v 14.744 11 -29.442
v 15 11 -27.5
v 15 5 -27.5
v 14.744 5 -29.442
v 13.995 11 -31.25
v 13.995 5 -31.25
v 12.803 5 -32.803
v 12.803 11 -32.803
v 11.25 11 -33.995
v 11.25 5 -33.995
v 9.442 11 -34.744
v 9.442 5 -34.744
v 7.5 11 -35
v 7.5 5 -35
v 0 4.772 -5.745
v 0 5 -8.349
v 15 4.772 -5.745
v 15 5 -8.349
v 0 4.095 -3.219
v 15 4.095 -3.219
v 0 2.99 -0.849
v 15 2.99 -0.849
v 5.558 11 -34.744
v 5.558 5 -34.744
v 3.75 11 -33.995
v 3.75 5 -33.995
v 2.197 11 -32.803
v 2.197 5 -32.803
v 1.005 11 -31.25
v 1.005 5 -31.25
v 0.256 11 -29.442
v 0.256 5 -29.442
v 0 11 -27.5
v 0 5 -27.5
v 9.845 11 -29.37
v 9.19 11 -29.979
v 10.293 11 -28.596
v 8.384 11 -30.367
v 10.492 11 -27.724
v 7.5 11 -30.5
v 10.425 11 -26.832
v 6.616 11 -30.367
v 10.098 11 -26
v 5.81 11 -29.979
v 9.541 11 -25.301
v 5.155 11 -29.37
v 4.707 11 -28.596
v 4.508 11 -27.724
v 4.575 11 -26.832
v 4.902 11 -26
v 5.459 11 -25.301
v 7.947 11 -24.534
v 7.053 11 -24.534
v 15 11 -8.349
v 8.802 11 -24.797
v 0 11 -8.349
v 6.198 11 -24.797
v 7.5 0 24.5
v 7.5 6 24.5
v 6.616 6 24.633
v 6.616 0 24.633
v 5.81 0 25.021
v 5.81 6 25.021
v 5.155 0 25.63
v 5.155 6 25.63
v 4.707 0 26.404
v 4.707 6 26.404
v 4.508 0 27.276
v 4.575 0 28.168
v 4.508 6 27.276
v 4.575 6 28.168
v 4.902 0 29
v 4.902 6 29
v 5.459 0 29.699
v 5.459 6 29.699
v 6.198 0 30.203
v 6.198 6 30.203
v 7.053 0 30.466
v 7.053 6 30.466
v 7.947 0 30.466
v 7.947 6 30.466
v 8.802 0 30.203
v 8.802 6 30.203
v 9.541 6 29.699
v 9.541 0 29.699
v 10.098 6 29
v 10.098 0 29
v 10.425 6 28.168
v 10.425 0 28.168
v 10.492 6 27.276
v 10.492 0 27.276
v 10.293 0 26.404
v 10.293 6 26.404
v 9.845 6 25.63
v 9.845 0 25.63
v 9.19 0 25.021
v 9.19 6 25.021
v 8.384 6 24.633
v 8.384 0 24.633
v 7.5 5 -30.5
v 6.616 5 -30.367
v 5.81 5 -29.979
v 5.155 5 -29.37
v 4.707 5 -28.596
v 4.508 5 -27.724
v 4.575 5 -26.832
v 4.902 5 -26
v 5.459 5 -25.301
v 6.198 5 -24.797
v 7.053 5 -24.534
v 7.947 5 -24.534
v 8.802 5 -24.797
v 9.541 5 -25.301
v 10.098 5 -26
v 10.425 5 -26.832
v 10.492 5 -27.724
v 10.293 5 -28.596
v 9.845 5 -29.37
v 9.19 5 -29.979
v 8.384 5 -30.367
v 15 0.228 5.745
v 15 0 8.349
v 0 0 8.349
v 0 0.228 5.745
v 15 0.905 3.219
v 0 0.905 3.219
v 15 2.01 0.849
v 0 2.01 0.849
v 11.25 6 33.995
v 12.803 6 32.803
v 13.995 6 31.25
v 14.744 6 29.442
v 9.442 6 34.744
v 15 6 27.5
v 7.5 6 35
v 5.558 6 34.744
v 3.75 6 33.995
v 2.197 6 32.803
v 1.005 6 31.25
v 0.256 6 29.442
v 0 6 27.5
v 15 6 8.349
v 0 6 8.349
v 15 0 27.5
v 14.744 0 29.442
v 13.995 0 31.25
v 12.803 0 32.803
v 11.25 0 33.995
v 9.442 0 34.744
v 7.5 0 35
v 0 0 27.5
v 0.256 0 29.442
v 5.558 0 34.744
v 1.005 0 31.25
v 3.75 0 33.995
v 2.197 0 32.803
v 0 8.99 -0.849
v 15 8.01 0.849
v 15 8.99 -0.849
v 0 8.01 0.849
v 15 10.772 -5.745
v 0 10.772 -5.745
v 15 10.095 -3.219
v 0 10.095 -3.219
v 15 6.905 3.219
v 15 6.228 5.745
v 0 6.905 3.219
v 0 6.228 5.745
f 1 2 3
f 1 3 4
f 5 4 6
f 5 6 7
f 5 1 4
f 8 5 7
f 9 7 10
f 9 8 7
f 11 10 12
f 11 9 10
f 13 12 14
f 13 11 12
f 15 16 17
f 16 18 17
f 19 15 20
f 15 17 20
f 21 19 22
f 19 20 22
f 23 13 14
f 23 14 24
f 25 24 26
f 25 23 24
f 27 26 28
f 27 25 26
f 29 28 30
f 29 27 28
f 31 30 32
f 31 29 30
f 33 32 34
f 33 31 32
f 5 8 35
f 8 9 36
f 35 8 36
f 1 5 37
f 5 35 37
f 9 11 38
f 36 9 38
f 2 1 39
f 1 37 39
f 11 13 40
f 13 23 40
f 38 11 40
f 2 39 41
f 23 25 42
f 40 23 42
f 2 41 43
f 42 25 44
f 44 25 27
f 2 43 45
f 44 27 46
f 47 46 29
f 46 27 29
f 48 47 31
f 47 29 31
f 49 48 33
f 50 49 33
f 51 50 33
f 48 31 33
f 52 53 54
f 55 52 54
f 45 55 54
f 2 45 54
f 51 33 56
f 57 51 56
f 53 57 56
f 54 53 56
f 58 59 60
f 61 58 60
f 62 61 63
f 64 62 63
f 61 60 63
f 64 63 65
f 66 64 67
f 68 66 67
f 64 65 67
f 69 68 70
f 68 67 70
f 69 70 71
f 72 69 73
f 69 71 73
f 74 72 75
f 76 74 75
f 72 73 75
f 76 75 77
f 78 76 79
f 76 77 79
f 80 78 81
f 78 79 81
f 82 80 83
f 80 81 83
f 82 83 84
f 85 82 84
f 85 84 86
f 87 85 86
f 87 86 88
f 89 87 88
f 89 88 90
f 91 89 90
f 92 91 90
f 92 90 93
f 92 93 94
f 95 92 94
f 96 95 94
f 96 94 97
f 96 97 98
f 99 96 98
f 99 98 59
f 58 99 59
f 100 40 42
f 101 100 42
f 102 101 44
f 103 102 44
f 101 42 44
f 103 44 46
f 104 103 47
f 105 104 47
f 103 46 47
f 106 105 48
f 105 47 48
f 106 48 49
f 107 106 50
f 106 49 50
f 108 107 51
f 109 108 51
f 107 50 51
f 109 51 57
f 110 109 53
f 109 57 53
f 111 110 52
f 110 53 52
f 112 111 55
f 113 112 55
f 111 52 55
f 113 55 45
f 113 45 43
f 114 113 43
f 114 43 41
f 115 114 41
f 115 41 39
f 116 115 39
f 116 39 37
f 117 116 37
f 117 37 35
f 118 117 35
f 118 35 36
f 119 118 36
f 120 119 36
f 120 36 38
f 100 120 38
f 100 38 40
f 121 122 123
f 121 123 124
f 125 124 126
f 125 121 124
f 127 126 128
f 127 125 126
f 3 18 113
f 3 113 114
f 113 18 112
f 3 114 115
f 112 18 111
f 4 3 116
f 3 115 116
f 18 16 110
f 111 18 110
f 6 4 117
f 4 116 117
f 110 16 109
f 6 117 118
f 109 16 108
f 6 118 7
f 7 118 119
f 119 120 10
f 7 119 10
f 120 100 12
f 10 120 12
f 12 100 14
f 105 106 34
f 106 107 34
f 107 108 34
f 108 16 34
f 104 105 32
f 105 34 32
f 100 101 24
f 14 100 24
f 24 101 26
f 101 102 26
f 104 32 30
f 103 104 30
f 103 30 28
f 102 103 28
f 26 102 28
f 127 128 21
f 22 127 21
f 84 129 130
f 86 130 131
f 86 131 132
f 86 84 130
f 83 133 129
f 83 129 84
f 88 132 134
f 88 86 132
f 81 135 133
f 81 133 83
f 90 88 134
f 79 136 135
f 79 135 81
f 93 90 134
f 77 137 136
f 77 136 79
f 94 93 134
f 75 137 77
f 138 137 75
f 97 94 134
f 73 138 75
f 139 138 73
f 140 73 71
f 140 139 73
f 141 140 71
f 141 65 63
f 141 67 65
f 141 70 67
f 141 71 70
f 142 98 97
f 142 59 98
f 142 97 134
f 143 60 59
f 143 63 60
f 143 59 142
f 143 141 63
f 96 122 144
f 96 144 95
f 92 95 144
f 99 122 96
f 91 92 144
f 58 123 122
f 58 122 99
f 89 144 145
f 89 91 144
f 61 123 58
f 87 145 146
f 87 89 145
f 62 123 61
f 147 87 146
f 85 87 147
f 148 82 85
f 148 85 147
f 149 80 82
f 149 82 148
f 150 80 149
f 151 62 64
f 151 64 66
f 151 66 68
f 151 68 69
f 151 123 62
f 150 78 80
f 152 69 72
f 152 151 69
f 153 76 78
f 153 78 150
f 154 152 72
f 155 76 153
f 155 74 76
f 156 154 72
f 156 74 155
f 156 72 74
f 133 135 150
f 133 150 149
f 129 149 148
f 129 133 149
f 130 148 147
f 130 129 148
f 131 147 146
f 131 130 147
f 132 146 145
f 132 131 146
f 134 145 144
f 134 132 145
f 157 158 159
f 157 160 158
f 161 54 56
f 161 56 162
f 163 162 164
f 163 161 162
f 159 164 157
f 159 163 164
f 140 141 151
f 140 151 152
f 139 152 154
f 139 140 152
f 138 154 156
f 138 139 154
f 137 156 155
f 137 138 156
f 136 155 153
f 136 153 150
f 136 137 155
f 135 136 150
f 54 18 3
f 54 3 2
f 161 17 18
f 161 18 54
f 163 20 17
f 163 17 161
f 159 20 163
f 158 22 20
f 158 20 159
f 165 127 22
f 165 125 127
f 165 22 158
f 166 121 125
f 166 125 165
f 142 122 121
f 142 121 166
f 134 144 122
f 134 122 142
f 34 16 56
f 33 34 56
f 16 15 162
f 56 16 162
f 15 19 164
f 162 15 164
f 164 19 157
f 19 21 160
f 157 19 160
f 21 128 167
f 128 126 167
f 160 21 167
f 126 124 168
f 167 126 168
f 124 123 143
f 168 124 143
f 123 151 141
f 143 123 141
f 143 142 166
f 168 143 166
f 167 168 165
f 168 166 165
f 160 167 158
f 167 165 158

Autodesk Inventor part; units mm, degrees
ref_plane "YZ Plane" through (0, 0, 0) normal (1, 0, 0) x (0, 1, 0)
ref_plane "XZ Plane" through (0, 0, 0) normal (0, 1, 0) x (-1, 0, 0)
ref_plane "XY Plane" through (0, 0, 0) normal (0, 0, 1) x (1, 0, 0)
sketch "Sketch1" plane through (0, 0, 0) normal (1, 0, 0) x (0, 1, 0)
  line L0 (0, 4.3301) -> (0, 35)
  line L1 (0, 35) -> (6, 35)
  line L2 (6, 35) -> (6, 4.3301)
  line L3 (5, -4.3301) -> (5, -35)
  line L4 (5, -35) -> (11, -35)
  line L5 (11, -35) -> (11, -4.3301)
  line L6 (0, 4.3301) -> (5, -4.3301)
  line L7 (2.5, 0) -> (6, 0) construction
  line L8 (6, 4.3301) -> (11, -4.3301)
  point P0 (0, 0)
  dimension "d1" = 6
  dimension "d11" = 6
extrude "Extrusão1" add sketch "Sketch1" along normal blind 15
fillet "Arredondamento1" radius 15 4 edges at (7.5, 11, -4.3301) (7.5, 6, 4.3301) (7.5, 0, 4.3301) (7.5, 5, -4.3301)
fillet "Arredondamento2" radius 7.5 4 edges at (15, 3, 35) (0, 3, 35) (15, 8, -35) (0, 8, -35)
sketch "Esboço2" plane through (0, 0, 8.3494) normal (0, -1, 0) x (1, 0, 0)
  line L0 (0, -9.1987) -> (15, -9.1987) projected
  arc A0 (15, 19.1506) -> (0, 19.1506) centre (7.5, 19.1506) ccw projected
  arc A1 (0, -35.8494) -> (15, -35.8494) centre (7.5, -35.8494) ccw projected
  circle A2 centre (7.5, 19.1506) radius 3
  circle A3 centre (7.5, -35.8494) radius 3
  point P0 (0, -8.3494)
  dimension "d29" = 6
  dimension "d31" = 6
hole "Furo1" at (7.5, 0, 27.5) at (7.5, 0, -27.5) direction (0, 1, 0) diameter 6 end through all
properties part number "jumelo"
